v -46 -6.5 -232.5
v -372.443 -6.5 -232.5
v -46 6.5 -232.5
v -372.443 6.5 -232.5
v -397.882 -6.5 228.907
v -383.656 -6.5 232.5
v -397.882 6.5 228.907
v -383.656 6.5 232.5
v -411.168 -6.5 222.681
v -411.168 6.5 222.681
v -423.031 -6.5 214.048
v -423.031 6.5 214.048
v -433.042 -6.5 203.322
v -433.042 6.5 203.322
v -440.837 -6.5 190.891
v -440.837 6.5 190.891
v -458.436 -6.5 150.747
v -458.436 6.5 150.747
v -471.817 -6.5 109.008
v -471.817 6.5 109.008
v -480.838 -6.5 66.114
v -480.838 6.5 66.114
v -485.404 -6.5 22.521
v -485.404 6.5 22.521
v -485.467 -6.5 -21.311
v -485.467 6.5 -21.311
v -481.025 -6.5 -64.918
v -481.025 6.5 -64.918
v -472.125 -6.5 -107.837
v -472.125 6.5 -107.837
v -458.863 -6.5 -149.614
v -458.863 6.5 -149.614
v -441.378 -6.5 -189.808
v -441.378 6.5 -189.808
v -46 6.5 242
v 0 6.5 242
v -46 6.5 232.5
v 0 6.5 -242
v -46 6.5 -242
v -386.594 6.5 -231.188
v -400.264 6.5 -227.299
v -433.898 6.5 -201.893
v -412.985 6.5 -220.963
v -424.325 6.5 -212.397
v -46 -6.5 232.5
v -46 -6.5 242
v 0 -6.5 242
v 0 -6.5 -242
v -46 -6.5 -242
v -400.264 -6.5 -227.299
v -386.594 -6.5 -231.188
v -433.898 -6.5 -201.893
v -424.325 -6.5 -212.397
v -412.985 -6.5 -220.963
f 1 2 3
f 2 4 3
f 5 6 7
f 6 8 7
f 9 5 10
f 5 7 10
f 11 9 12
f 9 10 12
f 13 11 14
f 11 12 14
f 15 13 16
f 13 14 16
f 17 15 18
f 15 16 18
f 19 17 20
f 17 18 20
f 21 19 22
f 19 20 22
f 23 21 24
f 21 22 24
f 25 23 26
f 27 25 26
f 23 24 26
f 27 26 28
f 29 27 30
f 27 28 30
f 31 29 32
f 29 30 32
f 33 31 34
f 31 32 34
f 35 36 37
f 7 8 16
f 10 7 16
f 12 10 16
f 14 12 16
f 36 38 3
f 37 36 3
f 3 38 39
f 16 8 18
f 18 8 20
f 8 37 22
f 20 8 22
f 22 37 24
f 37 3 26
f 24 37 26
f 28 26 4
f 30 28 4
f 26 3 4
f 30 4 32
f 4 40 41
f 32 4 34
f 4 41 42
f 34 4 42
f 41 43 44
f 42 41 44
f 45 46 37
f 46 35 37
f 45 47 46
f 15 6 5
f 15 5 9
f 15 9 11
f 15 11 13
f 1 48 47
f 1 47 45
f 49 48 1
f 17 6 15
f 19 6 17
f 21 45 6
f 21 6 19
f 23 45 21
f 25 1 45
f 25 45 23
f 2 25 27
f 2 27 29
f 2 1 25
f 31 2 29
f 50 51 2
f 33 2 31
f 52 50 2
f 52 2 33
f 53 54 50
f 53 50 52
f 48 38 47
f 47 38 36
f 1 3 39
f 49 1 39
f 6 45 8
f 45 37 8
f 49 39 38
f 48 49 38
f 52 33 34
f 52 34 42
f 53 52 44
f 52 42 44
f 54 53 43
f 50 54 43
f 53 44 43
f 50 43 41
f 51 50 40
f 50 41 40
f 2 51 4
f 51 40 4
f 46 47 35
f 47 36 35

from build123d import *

# Parameters (mm, degrees)
BOSS_EXTRUDE1_DEPTH = 6.5


with BuildPart() as part:
    # Sketch1 → Boss-Extrude1 (new, symmetric)
    with BuildSketch(Plane(origin=(0, 0, 0), x_dir=(1, 0, 0), z_dir=(0, 1, 0))):
        with BuildLine():
            Line((0, 242), (0, -242))
            Line((0, -242), (-46, -242))
            Line((-46, -242), (-46, -232.5))
            Line((-46, -232.5), (-383.656025613, -232.5))
            ThreePointArc((-383.656025613, -232.5), (-417.305553076, -218.648136781), (-440.836676218, -190.891136639))
            ThreePointArc((-440.836676218, -190.891136639), (-485.999569897, -0.605349387), (-441.377653297, 189.808022923))
            ThreePointArc((-441.377653297, 189.808022923), (-412.985038869, 220.962652578), (-372.443194837, 232.5))
            Line((-372.443194837, 232.5), (-46, 232.5))
            Line((-46, 232.5), (-46, 242))
            Line((-46, 242), (0, 242))
        make_face()
    extrude(amount=BOSS_EXTRUDE1_DEPTH, both=True)


solid = part.part
